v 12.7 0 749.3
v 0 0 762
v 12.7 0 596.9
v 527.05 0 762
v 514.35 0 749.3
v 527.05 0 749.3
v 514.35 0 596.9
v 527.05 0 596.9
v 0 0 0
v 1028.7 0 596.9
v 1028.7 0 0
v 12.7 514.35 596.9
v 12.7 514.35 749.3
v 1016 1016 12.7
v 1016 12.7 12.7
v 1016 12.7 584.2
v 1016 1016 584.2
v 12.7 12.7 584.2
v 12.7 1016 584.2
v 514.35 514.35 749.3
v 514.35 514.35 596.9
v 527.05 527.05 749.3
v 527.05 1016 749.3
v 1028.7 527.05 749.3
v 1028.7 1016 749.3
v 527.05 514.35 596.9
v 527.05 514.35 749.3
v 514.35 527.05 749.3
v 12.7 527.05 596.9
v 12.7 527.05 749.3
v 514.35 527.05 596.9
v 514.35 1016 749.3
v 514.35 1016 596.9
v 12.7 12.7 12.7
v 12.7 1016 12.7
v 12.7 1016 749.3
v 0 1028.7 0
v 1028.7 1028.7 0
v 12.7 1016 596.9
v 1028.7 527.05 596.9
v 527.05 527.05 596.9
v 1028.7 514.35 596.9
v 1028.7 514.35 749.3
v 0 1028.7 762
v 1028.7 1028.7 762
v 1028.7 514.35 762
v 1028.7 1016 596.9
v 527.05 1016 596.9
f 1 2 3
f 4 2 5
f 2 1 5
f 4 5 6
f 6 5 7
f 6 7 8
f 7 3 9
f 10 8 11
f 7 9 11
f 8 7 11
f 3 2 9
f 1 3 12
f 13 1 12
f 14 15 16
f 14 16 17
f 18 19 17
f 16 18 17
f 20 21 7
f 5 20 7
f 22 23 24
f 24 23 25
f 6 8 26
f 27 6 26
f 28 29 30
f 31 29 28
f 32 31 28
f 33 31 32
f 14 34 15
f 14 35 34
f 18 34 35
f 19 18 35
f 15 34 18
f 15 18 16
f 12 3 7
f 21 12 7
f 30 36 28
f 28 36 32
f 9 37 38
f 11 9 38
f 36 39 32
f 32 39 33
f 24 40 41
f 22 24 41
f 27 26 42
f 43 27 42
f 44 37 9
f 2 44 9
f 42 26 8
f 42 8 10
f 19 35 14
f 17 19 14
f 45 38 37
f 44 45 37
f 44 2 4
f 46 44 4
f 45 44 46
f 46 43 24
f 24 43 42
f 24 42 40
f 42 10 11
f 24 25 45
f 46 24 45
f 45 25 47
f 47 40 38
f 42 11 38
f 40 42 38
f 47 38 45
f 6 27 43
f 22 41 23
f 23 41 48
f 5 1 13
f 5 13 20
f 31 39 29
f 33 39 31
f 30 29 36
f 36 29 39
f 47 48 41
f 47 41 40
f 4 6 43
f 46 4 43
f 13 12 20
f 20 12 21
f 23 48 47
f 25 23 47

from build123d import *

# Parameters (mm, degrees)
F0_W     = 1028.7
F0_H     = 1028.7
F1_DEPTH = 12.7
F2_W     = 1028.7
F2_H     = 1028.7
F2_W_2   = 1003.3
F2_H_2   = 1003.3
F3_DEPTH = 584.2
F4_W     = 1028.7
F4_H     = 1028.7
F5_DEPTH = 12.7
F6_W     = 501.65
F6_H     = 488.95
F7_DEPTH = 152.4
F9_DEPTH = 12.7


with BuildPart() as f1:
    # F0 (on Top) → F1 (new body)
    with BuildSketch(Plane.XY):
        with Locations((514.35, 514.35)):
            Rectangle(F0_W, F0_H)
    extrude(amount=F1_DEPTH)

    # F2 (on Top) → F3 (join)
    with BuildSketch(Plane.XY):
        with Locations((514.35, 514.35)):
            Rectangle(F2_W, F2_H)
        with Locations((514.35, 514.35)):
            Rectangle(F2_W_2, F2_H_2, mode=Mode.SUBTRACT)
    extrude(amount=F3_DEPTH)

    # F4 (on face) → F5 (join)
    with BuildSketch(Plane.XY.offset(584.2)):
        with Locations((514.35, 514.35)):
            Rectangle(F4_W, F4_H)
    extrude(amount=F5_DEPTH)

    # F6 (on face) → F7 (join)
    with BuildSketch(Plane.XY.offset(596.9)):
        Polygon((1028.7, 1028.7), (0, 1028.7), (0, 0), (12.7, 0), (12.7, 12.7), (12.7, 514.35), (514.35, 514.35), (514.35, 12.7), (514.35, 0), (527.05, 0), (527.05, 12.7), (527.05, 514.35), (952.5, 514.35), (1028.7, 514.35), (1028.7, 527.05), (952.5, 527.05), (527.05, 527.05), (527.05, 1016), (1016, 1016), (1028.7, 1016), align=None)
        with Locations((263.525, 771.525)):
            Rectangle(F6_W, F6_H, mode=Mode.SUBTRACT)
    extrude(amount=F7_DEPTH)

    # F8 (on face) → F9 (join)
    with BuildSketch(Plane.XY.offset(749.3)):
        Polygon((0, 1028.7), (0, 0), (527.05, 0), (1028.7, 514.35), (1028.7, 1028.7), align=None)
    extrude(amount=F9_DEPTH)


solid = f1.part
